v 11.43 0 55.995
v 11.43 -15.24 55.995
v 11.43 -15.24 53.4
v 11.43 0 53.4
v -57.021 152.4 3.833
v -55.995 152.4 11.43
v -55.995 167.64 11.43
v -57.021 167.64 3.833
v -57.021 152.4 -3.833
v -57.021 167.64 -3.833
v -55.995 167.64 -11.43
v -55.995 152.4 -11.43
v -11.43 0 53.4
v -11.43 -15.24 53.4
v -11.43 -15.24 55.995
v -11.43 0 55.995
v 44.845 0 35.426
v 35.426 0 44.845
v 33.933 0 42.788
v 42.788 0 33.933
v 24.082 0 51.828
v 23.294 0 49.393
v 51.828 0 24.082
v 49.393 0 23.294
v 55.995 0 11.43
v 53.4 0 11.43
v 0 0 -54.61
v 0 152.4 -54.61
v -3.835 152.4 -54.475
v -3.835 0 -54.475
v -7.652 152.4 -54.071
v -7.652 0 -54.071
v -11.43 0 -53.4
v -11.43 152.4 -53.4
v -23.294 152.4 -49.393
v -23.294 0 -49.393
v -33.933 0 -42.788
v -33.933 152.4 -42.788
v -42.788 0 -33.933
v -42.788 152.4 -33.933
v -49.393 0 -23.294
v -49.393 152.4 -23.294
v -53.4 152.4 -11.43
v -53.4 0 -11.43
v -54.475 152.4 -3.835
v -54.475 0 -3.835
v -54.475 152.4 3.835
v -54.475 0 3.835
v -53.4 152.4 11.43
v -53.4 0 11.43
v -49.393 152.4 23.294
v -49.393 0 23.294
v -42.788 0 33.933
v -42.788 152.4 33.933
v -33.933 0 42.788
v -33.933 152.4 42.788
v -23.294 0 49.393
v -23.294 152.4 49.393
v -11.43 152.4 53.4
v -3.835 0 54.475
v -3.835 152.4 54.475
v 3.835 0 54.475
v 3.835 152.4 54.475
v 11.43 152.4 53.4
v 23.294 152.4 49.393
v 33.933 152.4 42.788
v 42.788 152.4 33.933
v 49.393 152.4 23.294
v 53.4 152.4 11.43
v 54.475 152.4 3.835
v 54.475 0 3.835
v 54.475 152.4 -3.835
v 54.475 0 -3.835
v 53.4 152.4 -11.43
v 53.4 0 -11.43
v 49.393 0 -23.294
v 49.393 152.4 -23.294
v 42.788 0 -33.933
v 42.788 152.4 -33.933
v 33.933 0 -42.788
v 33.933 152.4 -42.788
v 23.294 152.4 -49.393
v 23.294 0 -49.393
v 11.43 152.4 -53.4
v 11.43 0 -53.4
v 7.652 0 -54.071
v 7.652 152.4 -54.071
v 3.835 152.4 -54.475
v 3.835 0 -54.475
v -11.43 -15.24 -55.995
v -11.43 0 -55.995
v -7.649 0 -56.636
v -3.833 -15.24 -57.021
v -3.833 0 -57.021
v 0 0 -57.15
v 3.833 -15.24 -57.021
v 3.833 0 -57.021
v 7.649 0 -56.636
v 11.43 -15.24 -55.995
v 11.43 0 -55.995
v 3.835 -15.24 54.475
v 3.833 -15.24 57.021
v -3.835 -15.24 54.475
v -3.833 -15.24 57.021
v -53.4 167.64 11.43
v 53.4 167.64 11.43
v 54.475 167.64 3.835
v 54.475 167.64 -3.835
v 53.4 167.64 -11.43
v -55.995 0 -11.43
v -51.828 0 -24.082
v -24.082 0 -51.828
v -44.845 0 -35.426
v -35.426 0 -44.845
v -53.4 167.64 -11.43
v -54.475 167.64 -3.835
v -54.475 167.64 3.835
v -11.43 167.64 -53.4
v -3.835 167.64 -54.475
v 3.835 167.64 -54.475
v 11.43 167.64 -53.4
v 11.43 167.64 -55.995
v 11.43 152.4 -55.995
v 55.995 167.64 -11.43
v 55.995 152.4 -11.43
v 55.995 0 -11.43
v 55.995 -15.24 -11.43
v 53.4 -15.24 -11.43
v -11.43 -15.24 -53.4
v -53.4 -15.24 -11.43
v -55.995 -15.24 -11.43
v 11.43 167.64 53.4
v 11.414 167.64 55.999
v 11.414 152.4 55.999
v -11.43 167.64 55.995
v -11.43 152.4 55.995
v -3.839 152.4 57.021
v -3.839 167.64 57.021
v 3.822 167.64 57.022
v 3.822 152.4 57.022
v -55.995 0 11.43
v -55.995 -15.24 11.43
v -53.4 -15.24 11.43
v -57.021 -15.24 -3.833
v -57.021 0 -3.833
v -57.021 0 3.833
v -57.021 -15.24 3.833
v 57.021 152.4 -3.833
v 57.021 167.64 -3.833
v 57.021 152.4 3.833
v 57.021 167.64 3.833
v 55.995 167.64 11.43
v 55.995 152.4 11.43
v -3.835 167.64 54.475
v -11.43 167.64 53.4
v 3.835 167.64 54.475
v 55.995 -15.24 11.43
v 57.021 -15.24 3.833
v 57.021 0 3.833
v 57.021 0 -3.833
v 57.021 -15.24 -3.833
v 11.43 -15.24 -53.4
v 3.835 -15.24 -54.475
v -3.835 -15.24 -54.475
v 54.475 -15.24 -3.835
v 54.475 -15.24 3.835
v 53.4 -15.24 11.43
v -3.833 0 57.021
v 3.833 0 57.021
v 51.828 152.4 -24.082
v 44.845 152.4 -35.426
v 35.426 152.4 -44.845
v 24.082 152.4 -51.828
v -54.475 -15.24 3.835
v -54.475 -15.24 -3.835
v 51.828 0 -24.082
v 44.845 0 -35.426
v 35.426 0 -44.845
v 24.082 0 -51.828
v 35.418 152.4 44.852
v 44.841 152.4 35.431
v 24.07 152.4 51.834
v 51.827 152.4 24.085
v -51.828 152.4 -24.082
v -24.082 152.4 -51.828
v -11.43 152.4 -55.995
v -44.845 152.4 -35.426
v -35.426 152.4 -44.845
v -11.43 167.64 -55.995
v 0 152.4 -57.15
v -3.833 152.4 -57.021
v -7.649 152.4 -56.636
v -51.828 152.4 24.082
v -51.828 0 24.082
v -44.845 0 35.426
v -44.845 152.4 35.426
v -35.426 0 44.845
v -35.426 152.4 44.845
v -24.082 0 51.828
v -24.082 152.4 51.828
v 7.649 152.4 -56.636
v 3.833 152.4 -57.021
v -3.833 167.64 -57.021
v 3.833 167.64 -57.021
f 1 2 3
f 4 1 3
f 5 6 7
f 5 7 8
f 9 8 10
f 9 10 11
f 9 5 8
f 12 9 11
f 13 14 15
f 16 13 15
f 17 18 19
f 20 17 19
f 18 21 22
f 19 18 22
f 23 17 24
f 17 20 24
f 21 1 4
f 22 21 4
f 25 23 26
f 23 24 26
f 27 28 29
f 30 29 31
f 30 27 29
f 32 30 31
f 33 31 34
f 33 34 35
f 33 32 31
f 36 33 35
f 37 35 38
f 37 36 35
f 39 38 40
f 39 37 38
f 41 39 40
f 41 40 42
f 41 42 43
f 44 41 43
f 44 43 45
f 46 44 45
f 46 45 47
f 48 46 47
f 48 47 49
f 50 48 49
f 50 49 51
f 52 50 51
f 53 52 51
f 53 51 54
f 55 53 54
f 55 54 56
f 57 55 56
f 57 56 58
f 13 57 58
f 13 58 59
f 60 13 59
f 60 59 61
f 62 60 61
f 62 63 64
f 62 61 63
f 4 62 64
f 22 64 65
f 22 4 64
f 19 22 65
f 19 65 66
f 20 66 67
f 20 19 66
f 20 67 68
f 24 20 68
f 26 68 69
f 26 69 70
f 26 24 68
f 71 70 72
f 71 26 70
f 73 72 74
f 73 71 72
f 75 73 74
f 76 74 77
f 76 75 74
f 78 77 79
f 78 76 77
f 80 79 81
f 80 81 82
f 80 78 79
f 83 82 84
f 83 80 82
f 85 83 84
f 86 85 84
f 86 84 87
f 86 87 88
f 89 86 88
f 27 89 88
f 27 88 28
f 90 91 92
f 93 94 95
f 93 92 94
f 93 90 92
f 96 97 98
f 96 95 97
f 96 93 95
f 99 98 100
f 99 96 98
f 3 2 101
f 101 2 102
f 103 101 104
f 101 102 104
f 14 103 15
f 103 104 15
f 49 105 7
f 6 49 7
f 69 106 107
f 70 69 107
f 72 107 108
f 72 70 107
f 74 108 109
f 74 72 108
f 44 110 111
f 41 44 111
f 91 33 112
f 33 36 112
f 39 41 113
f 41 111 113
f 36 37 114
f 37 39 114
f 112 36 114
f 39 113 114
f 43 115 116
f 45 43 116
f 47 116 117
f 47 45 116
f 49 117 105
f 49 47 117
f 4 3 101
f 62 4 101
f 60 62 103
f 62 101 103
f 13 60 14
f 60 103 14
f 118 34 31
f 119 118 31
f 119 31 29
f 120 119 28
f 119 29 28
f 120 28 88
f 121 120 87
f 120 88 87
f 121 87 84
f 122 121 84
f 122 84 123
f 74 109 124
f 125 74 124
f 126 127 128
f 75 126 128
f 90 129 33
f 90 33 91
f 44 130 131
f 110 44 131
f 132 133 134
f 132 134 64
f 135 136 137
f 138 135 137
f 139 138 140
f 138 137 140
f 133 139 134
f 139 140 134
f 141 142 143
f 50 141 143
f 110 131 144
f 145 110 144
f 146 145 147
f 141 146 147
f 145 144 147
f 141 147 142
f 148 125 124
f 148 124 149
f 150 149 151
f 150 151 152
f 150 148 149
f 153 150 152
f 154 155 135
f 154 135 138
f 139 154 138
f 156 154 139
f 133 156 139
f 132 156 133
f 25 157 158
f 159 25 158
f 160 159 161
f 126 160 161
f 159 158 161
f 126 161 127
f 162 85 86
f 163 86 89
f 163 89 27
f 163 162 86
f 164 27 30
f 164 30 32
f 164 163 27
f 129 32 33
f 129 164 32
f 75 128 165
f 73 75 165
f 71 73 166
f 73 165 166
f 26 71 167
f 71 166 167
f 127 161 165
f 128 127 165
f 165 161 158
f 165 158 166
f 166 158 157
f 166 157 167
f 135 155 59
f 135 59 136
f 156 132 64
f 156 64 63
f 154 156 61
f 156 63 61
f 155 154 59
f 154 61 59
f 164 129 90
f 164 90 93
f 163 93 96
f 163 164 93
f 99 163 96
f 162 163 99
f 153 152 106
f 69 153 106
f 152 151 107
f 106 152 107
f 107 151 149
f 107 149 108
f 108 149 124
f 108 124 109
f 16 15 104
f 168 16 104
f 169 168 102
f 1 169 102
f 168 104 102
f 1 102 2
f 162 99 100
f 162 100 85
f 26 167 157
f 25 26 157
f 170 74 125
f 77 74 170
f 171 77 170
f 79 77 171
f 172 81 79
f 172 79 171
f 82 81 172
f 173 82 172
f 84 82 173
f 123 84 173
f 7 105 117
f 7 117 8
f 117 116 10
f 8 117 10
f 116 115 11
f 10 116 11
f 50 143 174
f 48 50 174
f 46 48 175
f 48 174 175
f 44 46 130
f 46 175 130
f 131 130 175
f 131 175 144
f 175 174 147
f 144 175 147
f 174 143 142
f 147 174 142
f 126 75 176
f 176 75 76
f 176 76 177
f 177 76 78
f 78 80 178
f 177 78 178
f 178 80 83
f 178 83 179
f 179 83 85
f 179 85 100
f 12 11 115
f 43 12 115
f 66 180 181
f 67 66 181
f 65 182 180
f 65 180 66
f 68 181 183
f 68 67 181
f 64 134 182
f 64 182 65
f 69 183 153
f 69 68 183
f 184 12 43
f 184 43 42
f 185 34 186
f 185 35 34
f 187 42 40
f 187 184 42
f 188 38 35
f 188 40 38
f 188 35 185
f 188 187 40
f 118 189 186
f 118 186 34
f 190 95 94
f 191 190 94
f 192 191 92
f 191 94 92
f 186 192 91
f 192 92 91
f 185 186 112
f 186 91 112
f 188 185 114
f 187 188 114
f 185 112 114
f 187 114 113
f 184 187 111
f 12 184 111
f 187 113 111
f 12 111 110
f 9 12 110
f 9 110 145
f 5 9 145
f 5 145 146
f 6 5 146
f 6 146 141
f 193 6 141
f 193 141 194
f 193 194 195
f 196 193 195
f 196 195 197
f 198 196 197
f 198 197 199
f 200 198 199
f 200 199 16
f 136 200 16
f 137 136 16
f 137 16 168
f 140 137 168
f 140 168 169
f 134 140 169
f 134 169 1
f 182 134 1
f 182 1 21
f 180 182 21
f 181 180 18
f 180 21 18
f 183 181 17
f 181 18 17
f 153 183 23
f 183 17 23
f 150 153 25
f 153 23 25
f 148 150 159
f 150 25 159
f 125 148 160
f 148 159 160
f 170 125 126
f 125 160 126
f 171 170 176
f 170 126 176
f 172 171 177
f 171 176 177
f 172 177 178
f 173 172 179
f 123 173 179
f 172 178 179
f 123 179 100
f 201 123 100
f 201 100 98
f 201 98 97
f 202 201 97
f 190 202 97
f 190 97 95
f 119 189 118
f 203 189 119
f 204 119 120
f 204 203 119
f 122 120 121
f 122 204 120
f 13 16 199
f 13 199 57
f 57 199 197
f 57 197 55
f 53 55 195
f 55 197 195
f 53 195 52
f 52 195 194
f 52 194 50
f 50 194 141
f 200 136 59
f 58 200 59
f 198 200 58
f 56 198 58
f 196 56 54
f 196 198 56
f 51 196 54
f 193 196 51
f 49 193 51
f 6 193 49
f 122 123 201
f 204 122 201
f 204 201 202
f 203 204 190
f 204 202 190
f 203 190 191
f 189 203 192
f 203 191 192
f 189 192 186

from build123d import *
from build123d.topology import SkipClean

# Parameters (mm, degrees)
SKETCH1_R           = 57.15
SKETCH1_R_2         = 54.61
BOSS_EXTRUDE1_DEPTH = 152.4
BOSS_EXTRUDE2_DEPTH = 15.24
BOSS_EXTRUDE3_START = 15.24
BOSS_EXTRUDE3_DEPTH = 15.24


with BuildPart() as part:
    # Sketch1 → Boss-Extrude1 (new body)
    with BuildSketch(Plane(origin=(0, 0, 0), x_dir=(1, 0, 0), z_dir=(0, 1, 0))):
        with Locations(Location((0, 0, 0), (0, 0, 90))):
            Circle(SKETCH1_R)
        with Locations(Location((0, 0, 0), (0, 0, 90))):
            Circle(SKETCH1_R_2, mode=Mode.SUBTRACT)
    extrude(amount=BOSS_EXTRUDE1_DEPTH)

    # Sketch2 → Boss-Extrude2 (add)
    with SkipClean():  # the faces are left unmerged after this step: merging them gives an invalid solid
        with BuildSketch(Plane(origin=(0, 152.4, 0), x_dir=(1, 0, 0), z_dir=(0, 1, 0))):
            with BuildLine():
                Line((-55.99533552, 11.43), (-53.400441946, 11.43))
                ThreePointArc((-53.400441946, 11.43), (-54.61, 0), (-53.400441946, -11.43))
                Line((-53.400441946, -11.43), (-55.99533552, -11.43))
                ThreePointArc((-55.99533552, -11.43), (-57.15, 0), (-55.99533552, 11.43))
            make_face()
            with BuildLine():
                Line((11.43, 53.400441946), (11.43, 55.99533552))
                ThreePointArc((11.43, 55.99533552), (0, 57.15), (-11.43, 55.99533552))
                Line((-11.43, 55.99533552), (-11.43, 53.400441946))
                ThreePointArc((-11.43, 53.400441946), (0, 54.61), (11.43, 53.400441946))
            make_face()
            with BuildLine():
                Line((53.400441946, 11.43), (55.99533552, 11.43))
                ThreePointArc((55.99533552, 11.43), (57.15, 0), (55.99533552, -11.43))
                Line((55.99533552, -11.43), (53.400441946, -11.43))
                ThreePointArc((53.400441946, -11.43), (54.61, 0), (53.400441946, 11.43))
            make_face()
            with BuildLine():
                Line((-11.43, -53.400441946), (-11.43, -55.99533552))
                ThreePointArc((-11.43, -55.99533552), (-0.008316105, -57.149999395), (11.413703346, -55.998659591))
                Line((11.413703346, -55.998659591), (11.43, -53.400441946))
                ThreePointArc((11.43, -53.400441946), (0, -54.61), (-11.43, -53.400441946))
            make_face()
        extrude(amount=BOSS_EXTRUDE2_DEPTH)

    # Sketch3 → Boss-Extrude3 (add)
    with SkipClean():  # the faces are left unmerged after this step: merging them gives an invalid solid
        with BuildSketch(Plane.XZ.offset(BOSS_EXTRUDE3_START)):
            with BuildLine():
                Line((11.43, 55.99533552), (11.43, 53.400441946))
                ThreePointArc((11.43, 53.400441946), (0, 54.61), (-11.43, 53.400441946))
                Line((-11.43, 53.400441946), (-11.43, 55.99533552))
                ThreePointArc((-11.43, 55.99533552), (0, 57.15), (11.43, 55.99533552))
            make_face()
            with BuildLine():
                Line((53.400441946, 11.43), (55.99533552, 11.43))
                ThreePointArc((55.99533552, 11.43), (57.15, 0), (55.99533552, -11.43))
                Line((55.99533552, -11.43), (53.400441946, -11.43))
                ThreePointArc((53.400441946, -11.43), (54.61, 0), (53.400441946, 11.43))
            make_face()
            with BuildLine():
                Line((-11.43, -53.400441946), (-11.43, -55.99533552))
                ThreePointArc((-11.43, -55.99533552), (0, -57.15), (11.43, -55.99533552))
                Line((11.43, -55.99533552), (11.43, -53.400441946))
                ThreePointArc((11.43, -53.400441946), (0, -54.61), (-11.43, -53.400441946))
            make_face()
            with BuildLine():
                Line((-55.99533552, 11.43), (-53.400441946, 11.43))
                ThreePointArc((-53.400441946, 11.43), (-54.61, 0), (-53.400441946, -11.43))
                Line((-53.400441946, -11.43), (-55.99533552, -11.43))
                ThreePointArc((-55.99533552, -11.43), (-57.15, 0), (-55.99533552, 11.43))
            make_face()
        extrude(amount=-BOSS_EXTRUDE3_DEPTH)


solid = part.part
